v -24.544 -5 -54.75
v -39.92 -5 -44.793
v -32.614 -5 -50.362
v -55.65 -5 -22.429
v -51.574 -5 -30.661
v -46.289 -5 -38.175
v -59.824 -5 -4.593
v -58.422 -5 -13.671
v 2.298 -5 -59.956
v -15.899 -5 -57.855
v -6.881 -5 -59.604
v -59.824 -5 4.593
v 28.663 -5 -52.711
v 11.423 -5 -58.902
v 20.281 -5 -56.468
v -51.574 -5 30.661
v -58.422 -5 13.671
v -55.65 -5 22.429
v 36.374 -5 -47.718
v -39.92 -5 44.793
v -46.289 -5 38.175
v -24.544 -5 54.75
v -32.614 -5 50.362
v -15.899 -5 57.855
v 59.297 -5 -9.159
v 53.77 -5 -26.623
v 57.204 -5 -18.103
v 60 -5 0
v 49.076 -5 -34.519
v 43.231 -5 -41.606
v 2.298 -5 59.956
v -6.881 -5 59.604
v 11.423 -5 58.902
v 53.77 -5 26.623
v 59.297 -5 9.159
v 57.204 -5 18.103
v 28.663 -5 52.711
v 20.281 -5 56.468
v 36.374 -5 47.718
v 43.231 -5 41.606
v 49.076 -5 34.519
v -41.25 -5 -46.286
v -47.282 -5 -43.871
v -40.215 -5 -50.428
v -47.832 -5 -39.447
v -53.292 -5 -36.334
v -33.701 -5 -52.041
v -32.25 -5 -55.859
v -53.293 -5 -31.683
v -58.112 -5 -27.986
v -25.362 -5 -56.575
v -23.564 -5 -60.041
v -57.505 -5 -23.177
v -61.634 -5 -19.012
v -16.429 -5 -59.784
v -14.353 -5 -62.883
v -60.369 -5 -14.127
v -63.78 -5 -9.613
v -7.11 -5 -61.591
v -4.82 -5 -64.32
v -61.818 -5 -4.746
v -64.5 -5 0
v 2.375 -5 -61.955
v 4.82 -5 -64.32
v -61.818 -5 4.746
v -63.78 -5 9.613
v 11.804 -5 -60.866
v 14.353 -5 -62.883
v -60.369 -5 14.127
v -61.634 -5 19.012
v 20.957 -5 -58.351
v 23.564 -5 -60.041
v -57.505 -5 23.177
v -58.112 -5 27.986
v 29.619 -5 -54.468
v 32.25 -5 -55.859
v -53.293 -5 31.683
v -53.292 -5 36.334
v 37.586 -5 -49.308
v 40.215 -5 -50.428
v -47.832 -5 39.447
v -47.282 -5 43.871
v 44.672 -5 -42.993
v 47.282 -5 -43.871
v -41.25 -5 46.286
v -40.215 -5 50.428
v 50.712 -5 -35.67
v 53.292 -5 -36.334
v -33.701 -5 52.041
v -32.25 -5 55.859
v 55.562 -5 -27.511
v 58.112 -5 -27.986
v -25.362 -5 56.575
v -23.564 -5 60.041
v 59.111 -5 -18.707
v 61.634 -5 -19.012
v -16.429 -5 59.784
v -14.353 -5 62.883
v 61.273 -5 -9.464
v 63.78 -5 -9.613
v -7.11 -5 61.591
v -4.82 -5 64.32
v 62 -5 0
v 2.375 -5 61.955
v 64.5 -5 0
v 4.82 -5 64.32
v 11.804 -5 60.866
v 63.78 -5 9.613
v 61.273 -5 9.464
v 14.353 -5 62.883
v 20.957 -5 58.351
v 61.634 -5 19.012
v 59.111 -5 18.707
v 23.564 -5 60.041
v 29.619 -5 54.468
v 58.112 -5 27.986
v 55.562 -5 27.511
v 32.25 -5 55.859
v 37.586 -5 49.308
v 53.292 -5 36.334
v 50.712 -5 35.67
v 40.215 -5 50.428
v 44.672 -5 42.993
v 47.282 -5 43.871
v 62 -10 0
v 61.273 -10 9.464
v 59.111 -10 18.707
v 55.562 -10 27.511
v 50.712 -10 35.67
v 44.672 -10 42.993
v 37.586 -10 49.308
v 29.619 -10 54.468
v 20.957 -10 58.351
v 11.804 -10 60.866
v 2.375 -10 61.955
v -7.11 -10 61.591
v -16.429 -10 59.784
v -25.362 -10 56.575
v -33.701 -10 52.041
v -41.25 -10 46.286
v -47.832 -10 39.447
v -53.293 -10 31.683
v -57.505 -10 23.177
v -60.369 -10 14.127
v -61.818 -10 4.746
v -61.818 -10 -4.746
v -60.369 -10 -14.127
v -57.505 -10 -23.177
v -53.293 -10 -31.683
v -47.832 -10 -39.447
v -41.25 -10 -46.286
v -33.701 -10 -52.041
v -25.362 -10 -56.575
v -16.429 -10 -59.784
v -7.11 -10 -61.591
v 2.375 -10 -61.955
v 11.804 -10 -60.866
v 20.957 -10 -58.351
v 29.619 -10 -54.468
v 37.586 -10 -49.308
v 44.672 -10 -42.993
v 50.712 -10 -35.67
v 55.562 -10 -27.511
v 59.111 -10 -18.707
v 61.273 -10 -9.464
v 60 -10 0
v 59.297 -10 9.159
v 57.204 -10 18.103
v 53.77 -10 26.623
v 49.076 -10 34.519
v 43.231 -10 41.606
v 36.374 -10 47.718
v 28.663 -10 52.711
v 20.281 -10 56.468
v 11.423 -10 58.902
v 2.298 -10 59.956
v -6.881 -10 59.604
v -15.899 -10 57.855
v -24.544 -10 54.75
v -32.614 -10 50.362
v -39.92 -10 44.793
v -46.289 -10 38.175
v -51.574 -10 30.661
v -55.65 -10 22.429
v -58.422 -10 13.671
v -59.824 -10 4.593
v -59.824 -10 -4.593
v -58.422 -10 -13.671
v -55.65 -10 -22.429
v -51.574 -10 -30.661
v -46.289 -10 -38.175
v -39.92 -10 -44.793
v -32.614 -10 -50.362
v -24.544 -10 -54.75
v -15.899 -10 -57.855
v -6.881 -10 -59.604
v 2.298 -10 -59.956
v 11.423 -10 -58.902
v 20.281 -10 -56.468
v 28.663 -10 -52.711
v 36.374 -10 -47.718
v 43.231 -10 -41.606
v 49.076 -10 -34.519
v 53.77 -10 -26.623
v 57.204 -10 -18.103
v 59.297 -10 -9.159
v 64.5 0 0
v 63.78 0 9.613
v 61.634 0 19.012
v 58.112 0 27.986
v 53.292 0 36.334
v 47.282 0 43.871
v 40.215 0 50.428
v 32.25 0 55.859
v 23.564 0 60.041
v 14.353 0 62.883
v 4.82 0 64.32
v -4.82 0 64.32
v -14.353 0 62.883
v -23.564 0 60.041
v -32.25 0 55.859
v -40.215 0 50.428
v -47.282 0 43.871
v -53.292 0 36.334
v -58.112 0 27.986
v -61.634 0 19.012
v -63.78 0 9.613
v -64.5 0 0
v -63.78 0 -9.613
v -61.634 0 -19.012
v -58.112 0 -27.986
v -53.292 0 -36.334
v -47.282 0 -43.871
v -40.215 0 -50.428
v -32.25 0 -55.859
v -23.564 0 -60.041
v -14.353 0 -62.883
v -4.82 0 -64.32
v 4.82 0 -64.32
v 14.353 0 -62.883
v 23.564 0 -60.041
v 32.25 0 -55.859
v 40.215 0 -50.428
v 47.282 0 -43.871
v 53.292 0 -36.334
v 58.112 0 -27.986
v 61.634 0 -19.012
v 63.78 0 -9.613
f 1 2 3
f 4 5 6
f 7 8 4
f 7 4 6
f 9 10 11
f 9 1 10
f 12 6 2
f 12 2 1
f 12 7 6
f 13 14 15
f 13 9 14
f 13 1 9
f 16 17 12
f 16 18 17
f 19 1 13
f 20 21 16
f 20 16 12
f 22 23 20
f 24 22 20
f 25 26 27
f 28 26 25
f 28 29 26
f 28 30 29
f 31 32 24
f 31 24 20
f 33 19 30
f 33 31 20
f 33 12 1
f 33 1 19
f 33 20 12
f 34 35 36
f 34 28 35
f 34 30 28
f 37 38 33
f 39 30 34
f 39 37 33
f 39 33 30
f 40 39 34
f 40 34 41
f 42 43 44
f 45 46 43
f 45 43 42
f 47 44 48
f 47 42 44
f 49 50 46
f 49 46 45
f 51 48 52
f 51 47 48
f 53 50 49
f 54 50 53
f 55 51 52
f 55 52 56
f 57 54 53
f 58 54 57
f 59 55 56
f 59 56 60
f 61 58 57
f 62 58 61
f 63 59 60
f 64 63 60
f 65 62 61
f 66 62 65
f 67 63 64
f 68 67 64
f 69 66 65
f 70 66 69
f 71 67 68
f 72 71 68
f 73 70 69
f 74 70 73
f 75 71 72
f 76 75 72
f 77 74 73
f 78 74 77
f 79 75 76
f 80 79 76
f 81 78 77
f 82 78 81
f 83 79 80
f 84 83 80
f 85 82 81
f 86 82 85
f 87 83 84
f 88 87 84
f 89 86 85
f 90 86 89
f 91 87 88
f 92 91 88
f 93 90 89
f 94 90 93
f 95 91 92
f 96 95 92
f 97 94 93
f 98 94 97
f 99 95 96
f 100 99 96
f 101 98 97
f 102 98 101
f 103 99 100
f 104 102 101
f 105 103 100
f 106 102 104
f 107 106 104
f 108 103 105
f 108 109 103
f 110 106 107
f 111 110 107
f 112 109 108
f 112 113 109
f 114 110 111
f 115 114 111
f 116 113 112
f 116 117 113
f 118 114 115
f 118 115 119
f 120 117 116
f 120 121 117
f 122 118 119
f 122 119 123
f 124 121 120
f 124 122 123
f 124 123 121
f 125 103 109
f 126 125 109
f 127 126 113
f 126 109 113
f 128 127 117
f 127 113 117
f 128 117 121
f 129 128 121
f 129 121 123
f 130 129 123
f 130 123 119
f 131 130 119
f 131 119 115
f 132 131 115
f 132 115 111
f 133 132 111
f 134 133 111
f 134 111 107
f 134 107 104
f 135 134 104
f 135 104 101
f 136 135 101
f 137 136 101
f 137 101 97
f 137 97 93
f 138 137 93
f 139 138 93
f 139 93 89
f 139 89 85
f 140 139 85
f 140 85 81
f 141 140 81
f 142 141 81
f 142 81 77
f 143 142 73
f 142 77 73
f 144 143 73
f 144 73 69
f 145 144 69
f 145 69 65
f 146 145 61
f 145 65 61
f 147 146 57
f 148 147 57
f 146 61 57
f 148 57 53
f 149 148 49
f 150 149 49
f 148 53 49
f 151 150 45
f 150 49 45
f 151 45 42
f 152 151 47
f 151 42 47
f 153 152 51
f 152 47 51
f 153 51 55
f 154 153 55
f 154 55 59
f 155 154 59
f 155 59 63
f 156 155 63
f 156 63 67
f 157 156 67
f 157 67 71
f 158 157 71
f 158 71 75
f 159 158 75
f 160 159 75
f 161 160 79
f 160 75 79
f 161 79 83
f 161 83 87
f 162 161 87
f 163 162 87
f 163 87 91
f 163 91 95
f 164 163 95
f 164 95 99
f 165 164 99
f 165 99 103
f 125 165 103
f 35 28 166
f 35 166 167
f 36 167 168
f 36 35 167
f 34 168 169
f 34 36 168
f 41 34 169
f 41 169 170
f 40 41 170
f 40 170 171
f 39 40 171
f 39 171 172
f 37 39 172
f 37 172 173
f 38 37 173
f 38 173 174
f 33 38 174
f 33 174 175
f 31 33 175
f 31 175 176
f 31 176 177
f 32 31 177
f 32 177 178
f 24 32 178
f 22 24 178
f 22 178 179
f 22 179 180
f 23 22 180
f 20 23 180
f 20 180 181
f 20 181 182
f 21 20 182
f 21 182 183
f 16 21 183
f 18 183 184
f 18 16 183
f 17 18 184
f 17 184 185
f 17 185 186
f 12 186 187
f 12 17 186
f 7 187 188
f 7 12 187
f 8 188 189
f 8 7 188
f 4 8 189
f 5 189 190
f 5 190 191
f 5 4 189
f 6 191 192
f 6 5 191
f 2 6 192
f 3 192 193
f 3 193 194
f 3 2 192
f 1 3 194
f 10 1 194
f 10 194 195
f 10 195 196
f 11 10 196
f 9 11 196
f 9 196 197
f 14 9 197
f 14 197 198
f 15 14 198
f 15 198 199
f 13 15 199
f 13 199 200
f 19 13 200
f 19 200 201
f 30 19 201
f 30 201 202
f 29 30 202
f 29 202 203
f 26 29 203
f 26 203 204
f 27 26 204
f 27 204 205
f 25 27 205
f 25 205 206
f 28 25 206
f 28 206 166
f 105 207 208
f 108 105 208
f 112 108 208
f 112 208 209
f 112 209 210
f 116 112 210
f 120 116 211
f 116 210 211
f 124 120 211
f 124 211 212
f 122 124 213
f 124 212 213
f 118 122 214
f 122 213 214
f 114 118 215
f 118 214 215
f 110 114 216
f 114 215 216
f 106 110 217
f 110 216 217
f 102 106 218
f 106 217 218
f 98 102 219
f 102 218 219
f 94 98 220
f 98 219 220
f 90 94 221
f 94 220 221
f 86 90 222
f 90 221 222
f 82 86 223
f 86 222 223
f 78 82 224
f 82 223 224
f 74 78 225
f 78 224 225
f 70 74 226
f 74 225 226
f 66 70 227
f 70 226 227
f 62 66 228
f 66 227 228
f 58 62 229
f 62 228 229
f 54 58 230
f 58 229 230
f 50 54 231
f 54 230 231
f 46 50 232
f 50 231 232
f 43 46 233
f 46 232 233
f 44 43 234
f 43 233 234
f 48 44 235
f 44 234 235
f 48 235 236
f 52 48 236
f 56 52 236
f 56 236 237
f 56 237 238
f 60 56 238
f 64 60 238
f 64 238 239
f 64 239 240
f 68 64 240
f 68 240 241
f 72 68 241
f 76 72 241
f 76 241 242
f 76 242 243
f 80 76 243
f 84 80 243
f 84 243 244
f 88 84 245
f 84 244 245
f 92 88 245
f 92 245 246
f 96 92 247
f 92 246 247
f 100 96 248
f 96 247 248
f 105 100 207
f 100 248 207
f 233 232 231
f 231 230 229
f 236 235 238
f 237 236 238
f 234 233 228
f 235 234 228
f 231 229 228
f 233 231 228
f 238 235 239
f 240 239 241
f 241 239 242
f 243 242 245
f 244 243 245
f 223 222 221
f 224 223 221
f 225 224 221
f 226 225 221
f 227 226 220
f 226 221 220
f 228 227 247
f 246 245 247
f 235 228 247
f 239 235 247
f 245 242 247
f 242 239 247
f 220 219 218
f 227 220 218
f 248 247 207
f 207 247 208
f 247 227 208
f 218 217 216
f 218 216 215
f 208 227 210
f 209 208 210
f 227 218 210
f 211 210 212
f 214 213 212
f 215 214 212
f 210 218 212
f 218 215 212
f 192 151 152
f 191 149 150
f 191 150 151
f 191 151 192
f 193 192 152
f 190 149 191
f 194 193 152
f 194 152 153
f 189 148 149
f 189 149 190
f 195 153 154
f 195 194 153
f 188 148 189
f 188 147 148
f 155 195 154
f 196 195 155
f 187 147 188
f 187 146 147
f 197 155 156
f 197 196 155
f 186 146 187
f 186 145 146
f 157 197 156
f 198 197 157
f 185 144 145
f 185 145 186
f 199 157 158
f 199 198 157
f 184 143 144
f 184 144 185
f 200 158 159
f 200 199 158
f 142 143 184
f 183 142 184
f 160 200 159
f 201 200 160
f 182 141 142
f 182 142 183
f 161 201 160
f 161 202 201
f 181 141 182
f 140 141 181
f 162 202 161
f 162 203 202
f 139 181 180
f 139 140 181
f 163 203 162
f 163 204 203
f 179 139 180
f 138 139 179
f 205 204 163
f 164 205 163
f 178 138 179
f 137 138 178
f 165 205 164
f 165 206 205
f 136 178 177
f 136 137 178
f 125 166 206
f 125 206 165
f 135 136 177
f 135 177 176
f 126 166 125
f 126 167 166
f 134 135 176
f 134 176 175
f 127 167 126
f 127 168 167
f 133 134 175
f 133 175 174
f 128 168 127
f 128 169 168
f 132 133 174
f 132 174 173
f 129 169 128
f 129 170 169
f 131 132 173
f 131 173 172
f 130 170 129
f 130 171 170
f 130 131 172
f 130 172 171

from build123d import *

# Parameters (mm, degrees)
F0_R     = 64.5
F0_R_2   = 62
F0_R_3   = 60
F1_DEPTH = 5
F2_DEPTH = 10


with BuildPart() as f1:
    # F0 (on Front) → F1 (new body)
    with BuildSketch(Plane.XZ):
        Circle(F0_R)
        Circle(F0_R_2, mode=Mode.SUBTRACT)
        Circle(F0_R_2)
        Circle(F0_R_3, mode=Mode.SUBTRACT)
        Circle(F0_R_3)
    extrude(amount=F1_DEPTH)

    # F0 (on Front) → F2 (join)
    with BuildSketch(Plane.XZ):
        Circle(F0_R_2)
        Circle(F0_R_3, mode=Mode.SUBTRACT)
    extrude(amount=F2_DEPTH)


solid = f1.part
